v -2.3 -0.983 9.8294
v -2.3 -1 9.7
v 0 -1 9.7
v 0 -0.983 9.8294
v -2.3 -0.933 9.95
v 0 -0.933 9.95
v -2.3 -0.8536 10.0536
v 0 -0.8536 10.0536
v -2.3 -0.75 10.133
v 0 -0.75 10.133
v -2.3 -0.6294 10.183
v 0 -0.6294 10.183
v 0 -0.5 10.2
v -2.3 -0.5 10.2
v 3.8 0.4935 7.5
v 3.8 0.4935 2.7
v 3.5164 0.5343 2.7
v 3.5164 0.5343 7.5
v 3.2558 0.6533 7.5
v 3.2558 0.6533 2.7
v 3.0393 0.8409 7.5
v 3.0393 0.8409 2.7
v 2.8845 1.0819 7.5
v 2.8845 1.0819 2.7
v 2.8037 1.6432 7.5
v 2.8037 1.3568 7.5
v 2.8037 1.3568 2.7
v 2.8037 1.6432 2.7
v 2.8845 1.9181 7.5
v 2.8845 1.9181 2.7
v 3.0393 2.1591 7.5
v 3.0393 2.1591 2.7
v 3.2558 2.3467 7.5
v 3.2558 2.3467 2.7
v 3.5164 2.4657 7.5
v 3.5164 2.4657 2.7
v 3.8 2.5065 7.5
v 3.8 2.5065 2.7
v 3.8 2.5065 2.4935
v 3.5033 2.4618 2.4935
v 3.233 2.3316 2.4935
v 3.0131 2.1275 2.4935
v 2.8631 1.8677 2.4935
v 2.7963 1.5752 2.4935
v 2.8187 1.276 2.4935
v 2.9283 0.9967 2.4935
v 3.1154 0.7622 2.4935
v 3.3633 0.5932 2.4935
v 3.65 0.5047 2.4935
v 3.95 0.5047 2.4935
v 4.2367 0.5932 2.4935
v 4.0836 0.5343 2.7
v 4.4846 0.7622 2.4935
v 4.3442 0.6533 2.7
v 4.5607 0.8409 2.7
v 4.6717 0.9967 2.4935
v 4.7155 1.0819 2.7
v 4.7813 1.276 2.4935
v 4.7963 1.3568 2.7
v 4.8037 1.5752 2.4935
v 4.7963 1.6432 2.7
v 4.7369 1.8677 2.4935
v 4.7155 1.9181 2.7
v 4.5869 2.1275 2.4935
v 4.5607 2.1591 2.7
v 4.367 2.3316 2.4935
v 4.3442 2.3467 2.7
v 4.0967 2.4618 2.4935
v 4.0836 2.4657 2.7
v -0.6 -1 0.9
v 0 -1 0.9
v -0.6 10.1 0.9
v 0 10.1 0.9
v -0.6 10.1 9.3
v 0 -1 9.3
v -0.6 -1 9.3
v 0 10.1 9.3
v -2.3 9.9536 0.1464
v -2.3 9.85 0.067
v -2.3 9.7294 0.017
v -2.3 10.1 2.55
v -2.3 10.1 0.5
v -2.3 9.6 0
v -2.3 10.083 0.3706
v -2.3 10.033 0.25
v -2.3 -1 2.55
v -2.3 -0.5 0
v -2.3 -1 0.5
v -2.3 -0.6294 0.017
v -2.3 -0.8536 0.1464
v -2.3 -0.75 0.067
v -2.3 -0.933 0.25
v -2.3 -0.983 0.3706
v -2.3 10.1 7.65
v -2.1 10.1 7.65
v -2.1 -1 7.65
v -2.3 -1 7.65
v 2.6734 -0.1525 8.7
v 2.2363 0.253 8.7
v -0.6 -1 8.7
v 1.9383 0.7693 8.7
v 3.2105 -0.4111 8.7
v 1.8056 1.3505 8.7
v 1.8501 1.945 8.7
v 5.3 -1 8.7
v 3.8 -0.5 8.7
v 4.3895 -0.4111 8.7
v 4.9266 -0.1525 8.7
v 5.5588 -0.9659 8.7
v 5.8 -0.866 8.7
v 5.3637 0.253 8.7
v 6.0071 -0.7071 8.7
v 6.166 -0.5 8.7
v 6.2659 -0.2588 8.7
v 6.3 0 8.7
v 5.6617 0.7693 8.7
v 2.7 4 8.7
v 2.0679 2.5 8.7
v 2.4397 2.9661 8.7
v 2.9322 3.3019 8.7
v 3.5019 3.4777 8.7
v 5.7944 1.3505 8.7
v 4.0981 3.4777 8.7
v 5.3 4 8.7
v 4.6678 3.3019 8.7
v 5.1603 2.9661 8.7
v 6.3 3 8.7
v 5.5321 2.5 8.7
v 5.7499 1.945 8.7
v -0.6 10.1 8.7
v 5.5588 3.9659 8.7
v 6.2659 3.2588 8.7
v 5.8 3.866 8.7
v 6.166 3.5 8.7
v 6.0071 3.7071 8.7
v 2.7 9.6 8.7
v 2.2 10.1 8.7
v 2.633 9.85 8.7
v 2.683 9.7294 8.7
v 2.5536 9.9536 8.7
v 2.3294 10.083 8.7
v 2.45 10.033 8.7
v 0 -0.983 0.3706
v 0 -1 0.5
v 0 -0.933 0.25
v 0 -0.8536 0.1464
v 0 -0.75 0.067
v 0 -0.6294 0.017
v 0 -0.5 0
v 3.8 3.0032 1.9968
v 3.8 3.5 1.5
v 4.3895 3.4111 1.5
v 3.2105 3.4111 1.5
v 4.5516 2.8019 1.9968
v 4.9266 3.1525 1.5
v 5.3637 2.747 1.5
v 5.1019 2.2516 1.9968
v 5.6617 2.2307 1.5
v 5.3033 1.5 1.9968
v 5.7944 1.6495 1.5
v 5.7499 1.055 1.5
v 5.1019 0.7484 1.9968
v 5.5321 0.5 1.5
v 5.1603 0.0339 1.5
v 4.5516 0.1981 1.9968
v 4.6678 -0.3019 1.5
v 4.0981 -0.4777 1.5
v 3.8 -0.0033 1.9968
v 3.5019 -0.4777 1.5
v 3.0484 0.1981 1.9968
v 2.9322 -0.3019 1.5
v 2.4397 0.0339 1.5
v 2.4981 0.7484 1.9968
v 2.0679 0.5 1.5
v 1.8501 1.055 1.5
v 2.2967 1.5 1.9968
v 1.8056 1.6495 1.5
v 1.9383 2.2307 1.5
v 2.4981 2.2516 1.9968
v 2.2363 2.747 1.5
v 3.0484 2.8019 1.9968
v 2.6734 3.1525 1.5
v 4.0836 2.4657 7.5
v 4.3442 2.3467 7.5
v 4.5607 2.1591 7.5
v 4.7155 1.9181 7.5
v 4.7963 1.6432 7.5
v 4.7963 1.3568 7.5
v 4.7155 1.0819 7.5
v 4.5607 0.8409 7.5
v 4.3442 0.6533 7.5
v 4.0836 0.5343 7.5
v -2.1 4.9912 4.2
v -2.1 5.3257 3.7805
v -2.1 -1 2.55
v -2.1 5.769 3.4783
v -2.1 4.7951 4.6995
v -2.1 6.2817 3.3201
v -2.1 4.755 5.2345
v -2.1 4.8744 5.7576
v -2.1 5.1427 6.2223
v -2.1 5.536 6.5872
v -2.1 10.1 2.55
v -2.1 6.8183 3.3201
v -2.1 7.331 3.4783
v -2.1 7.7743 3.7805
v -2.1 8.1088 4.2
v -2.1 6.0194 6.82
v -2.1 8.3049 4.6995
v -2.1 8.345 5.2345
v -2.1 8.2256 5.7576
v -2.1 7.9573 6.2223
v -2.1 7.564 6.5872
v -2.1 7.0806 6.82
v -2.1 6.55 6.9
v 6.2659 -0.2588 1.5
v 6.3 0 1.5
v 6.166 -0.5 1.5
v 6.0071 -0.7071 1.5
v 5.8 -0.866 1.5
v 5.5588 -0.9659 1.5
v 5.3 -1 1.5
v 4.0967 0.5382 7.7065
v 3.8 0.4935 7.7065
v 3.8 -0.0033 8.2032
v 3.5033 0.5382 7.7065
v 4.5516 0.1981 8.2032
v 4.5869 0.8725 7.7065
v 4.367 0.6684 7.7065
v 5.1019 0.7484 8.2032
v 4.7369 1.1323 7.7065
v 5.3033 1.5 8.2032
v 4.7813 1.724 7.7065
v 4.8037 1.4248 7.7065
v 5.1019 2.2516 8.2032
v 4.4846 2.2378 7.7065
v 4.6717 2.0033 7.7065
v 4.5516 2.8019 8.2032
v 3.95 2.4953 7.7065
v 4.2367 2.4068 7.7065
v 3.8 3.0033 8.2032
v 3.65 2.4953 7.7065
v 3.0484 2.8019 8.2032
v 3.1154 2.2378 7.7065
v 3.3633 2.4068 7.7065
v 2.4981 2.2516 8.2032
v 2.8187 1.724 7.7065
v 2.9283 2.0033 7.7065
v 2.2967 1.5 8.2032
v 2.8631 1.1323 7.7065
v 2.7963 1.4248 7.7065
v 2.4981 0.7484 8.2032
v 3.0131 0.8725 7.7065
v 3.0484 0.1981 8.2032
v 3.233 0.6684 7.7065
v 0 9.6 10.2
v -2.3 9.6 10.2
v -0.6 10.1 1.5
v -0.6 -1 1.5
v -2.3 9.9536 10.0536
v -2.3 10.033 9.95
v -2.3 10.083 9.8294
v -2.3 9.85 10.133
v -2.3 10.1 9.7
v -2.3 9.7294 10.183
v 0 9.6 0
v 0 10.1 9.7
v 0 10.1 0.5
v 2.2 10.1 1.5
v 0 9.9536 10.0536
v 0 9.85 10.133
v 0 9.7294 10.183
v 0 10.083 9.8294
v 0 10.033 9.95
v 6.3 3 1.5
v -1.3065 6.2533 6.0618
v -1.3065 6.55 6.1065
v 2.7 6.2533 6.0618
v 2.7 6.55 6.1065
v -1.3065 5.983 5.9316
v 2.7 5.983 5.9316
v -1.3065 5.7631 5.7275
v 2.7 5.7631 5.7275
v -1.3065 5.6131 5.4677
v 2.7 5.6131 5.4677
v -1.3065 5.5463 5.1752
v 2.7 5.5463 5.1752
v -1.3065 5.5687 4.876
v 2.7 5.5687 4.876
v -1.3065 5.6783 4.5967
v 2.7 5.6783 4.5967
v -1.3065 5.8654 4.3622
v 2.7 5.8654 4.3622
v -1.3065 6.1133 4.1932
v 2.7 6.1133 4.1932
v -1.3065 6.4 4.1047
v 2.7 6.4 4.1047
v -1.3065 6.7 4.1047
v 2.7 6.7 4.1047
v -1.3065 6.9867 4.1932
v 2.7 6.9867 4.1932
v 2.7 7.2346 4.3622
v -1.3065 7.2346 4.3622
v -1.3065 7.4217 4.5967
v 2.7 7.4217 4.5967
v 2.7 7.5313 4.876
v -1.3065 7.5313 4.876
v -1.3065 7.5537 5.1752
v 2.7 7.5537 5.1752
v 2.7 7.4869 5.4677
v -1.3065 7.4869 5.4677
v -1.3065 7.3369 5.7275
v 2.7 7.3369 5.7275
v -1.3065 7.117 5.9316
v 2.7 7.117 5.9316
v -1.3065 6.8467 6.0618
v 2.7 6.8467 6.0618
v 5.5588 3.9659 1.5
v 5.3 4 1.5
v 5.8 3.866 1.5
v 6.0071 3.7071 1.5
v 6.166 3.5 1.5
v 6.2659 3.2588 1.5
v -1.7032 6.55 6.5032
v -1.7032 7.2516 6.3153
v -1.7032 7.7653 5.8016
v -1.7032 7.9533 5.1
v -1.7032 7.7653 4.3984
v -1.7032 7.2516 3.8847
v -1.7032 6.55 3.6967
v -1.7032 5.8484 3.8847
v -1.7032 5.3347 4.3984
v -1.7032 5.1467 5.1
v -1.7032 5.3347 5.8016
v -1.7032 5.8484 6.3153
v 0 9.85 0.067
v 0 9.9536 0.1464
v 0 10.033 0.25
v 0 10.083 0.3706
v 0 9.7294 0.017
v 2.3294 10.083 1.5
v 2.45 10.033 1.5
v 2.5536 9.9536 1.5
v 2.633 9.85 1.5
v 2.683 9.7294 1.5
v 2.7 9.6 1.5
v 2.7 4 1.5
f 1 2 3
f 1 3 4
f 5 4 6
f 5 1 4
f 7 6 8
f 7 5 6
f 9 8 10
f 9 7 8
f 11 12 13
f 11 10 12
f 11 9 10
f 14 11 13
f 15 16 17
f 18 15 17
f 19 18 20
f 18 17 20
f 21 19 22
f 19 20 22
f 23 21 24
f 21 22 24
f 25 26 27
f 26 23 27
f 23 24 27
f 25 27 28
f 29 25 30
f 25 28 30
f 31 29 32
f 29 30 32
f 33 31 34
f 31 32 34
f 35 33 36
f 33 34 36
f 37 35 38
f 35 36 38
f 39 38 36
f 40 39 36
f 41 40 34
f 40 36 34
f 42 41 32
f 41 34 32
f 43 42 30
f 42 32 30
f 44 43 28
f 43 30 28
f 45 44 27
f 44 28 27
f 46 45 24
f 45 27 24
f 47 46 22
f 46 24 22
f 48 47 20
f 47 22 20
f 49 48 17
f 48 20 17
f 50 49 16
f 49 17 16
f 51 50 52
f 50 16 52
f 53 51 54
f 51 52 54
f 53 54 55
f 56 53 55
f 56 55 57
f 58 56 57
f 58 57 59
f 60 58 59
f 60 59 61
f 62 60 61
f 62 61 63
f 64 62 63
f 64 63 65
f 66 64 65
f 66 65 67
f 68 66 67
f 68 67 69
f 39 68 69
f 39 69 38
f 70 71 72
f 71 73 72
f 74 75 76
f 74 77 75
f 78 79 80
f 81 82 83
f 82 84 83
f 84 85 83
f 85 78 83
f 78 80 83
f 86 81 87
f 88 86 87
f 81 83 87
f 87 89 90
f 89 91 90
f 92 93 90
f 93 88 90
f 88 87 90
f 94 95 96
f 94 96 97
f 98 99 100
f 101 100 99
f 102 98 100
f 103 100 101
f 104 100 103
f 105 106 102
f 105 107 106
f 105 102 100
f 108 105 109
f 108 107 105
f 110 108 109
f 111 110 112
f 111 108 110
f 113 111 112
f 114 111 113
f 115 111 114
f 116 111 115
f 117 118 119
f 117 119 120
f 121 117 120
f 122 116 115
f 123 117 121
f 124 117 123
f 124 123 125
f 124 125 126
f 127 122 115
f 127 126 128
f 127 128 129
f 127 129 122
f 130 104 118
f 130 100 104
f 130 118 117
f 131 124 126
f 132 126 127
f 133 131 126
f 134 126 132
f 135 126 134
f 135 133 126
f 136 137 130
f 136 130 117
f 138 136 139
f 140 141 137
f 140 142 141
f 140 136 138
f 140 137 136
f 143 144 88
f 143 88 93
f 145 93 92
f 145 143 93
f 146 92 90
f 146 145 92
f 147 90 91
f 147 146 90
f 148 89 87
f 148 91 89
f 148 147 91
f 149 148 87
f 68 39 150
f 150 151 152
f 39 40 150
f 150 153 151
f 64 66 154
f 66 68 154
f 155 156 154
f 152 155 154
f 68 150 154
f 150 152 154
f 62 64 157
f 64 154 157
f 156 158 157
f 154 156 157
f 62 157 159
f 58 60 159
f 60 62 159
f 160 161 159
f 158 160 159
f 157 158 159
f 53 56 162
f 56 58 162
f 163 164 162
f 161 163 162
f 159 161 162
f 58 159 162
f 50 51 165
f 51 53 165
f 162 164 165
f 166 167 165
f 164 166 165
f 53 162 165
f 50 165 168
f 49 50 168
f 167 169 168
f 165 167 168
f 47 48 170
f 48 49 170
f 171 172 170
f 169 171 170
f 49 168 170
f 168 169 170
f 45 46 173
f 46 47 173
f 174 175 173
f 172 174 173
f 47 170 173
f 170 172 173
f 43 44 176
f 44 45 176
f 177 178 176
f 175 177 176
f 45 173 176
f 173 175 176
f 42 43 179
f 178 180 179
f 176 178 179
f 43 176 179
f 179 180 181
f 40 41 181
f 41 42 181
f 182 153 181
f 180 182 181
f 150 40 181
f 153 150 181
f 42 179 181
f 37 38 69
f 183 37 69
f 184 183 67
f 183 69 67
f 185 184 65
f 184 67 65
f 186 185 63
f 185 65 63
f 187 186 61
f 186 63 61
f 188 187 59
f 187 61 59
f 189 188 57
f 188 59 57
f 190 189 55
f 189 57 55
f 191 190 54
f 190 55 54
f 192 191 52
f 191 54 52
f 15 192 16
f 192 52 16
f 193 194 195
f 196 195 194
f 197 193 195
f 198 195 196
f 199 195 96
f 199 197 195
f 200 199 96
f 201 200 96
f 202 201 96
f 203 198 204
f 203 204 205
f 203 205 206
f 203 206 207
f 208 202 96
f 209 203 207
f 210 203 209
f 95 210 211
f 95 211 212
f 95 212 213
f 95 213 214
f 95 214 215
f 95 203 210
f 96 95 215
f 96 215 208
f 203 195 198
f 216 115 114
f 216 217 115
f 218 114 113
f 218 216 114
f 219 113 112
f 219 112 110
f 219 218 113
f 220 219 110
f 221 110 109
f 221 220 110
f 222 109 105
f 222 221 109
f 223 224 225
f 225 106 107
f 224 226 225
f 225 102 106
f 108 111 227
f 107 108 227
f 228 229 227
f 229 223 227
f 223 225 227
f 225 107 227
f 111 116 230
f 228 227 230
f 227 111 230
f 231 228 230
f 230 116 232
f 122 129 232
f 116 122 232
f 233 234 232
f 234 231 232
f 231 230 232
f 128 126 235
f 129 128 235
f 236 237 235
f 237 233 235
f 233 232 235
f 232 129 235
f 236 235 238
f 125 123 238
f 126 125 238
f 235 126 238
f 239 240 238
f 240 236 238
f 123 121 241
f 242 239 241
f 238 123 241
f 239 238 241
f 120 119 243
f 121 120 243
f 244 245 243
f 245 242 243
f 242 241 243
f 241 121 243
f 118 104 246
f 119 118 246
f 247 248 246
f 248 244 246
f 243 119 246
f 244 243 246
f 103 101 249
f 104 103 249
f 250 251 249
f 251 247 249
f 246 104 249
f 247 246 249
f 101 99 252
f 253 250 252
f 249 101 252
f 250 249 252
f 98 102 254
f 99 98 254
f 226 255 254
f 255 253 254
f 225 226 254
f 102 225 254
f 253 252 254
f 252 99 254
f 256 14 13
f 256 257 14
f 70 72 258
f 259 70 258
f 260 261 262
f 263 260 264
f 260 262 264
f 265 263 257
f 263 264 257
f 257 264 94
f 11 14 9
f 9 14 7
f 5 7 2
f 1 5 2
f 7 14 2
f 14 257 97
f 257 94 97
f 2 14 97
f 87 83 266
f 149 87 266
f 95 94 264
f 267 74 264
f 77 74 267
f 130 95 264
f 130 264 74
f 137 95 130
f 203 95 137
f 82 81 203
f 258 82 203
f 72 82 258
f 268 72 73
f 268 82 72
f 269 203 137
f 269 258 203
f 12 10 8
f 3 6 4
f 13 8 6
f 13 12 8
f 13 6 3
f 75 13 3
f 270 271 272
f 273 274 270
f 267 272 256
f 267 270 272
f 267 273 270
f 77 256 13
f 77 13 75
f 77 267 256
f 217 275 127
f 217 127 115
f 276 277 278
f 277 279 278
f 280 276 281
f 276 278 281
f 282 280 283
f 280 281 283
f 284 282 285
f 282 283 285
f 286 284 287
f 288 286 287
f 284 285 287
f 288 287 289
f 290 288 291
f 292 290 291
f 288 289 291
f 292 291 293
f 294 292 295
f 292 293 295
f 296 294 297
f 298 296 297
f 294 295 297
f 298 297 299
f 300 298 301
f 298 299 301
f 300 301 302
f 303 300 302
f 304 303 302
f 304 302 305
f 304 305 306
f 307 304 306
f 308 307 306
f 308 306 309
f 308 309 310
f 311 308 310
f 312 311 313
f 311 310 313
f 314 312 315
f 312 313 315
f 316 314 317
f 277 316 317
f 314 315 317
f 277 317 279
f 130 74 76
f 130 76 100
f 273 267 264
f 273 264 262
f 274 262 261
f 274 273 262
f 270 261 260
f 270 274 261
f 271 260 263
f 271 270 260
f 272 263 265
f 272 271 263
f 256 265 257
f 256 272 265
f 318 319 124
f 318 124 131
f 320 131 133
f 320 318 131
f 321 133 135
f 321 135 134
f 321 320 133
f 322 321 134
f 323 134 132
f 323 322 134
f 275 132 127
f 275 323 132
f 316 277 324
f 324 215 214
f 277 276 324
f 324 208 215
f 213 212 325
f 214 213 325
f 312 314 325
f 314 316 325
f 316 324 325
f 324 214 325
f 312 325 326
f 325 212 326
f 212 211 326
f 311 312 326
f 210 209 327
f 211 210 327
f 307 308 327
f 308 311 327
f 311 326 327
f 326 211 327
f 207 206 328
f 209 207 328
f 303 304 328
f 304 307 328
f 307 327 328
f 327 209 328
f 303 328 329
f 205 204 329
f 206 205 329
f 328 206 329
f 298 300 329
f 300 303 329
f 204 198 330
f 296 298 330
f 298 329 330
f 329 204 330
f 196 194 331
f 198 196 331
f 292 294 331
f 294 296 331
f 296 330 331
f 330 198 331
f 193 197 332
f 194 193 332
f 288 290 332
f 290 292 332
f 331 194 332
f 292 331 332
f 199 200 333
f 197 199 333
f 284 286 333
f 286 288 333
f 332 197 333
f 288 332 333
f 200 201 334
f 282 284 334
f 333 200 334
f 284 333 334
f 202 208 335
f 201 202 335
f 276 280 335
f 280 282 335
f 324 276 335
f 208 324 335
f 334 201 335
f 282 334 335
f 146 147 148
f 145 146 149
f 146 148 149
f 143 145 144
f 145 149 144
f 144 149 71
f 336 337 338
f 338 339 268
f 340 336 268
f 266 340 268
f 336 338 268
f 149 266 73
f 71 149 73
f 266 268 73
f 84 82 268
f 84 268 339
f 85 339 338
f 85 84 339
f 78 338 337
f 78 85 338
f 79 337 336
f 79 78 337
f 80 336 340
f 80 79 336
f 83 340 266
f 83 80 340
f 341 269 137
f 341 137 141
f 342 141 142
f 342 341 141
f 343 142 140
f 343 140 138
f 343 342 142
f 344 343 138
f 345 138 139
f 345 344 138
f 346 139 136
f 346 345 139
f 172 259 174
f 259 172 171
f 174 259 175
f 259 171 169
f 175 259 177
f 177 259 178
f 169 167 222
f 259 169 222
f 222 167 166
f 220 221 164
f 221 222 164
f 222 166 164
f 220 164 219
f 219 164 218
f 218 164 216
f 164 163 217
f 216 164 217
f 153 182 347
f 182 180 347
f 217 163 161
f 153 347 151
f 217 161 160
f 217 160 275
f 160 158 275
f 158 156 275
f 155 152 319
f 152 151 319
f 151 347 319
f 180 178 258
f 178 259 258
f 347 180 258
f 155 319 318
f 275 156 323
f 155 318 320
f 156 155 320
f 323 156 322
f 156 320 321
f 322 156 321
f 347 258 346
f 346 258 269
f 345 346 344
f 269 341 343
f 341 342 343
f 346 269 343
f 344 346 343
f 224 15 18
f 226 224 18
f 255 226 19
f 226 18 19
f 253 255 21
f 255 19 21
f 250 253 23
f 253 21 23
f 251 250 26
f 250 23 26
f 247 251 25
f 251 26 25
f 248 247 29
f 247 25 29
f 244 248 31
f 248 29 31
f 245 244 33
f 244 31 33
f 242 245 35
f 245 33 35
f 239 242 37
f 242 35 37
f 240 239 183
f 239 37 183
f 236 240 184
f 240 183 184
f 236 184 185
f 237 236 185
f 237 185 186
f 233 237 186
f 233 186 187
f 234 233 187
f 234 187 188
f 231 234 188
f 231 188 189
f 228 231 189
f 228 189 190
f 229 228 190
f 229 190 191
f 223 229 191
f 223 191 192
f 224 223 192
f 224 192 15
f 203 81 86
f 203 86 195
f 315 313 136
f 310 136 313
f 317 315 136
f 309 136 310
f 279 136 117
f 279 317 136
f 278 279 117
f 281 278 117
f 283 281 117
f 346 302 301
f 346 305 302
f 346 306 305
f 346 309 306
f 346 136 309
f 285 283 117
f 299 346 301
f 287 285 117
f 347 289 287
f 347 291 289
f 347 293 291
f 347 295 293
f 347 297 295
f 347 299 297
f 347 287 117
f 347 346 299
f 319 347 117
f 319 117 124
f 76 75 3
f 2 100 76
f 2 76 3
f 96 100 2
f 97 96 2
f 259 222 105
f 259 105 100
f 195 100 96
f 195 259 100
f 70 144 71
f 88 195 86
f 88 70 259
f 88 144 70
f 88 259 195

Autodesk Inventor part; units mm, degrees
ref_plane "YZ Plane" through (0, 0, 0) normal (1, 0, 0) x (0, 1, 0)
ref_plane "XZ Plane" through (0, 0, 0) normal (0, 1, 0) x (-1, 0, 0)
ref_plane "XY Plane" through (0, 0, 0) normal (0, 0, 1) x (1, 0, 0)
sketch "Skizze1" plane through (0, 0, 0) normal (0, 0, 1) x (1, 0, 0)
  line L0 (2.7, 9.6) -> (2.7, 4)
  arc A0 (2.7, 9.6) -> (2.2, 10.1) centre (2.2, 9.6) ccw
  line L1 (-0.6, 10.1) -> (2.2, 10.1)
  line L2 (-2.3, 10.1) -> (-0.6, 10.1)
  line L3 (-2.3, 10.1) -> (-2.3, 9.1)
  line L4 (-2.3, 9.1) -> (-2.3, 0)
  line L5 (-2.3, 0) -> (-2.3, -1)
  line L6 (-0.6, -1) -> (-2.3, -1)
  line L7 (-0.6, -0.995) -> (0, -0.995)
  line L8 (5.3, -1) -> (-0.6, -1)
  arc A1 (5.3, -1) -> (6.3, 0) centre (5.3, 0) ccw
  line L9 (6.3, 3) -> (6.3, 0)
  arc A2 (6.3, 3) -> (5.3, 4) centre (5.3, 3) ccw
  line L10 (2.7, 4) -> (5.3, 4)
  point P0 (0, 0)
extrude "Extrusion1" add sketch "Skizze1" along normal blind 10.2
sketch "Skizze2" plane through (-2.3, 10.1, 0) normal (0, 1, 0) x (1, 0, 0)
  line L0 (0, -10.2) -> (4.5, -10.2) projected
  line L1 (0, 0) -> (0, -10.2) projected
  line L2 (2.3, 0) -> (2.3, -0.9)
  line L3 (2.3, -0.9) -> (1.7, -0.9)
  line L4 (1.7, -0.9) -> (1.7, -1.5)
  line L5 (1.7, -1.5) -> (8.6, -1.5)
  line L6 (8.6, 0) -> (8.6, -10.2) projected
  line L7 (2.3, -10.2) -> (2.3, -9.3)
  line L8 (2.3, -9.3) -> (1.7, -9.3)
  line L9 (1.7, -9.3) -> (1.7, -8.7)
  line L10 (1.7, -8.7) -> (8.6, -8.7)
  line L11 (8.6, -1.5) -> (8.6, 0)
  line L12 (2.3, 0) -> (8.6, 0)
  line L13 (2.3, -10.2) -> (8.6, -10.2)
  line L14 (8.6, -8.7) -> (8.6, -10.2)
  dimension "d2" = 0.9
  dimension "d3" = 0.6
  dimension "d4" = 0.9
  dimension "d5" = 0.6
  dimension "d6" = 2.3
  dimension "d7" = 2.3
  dimension "d8" = 1.7
  dimension "d9" = 0.6
  dimension "d10" = 1.7
extrude "Extrusion2" cut sketch "Skizze2" against normal blind 12
sketch "Skizze3" plane through (2.7, 4, 8.7) normal (1, 0, 0) x (0, 0, -1)
  line L0 (0, 5.6) -> (0, 0) projected
  line L1 (7.2, 0) -> (0, 0) projected
  line L2 (7.2, 0) -> (7.2, 5.6) projected
  line L3 (7.2, 5.6) -> (0, 5.6) projected
  line L4 (7.2, 6.1) -> (0, 6.1) projected
  line L5 (-1.5, -5) -> (-1.5, 6.1) projected
  point P0 (8.7, -4)
  point P1 (3.55, 2.55)
  dimension "d13" = 3.55
  dimension "d14" = 5.05
sketch "Skizze4" plane through (-2.3, -1, 0) normal (-1, 0, 0) x (0, 0, 1)
  line L0 (10.2, 0) -> (10.2, 11.1) projected
  line L1 (0, 11.1) -> (10.2, 11.1) projected
  line L2 (0, 0) -> (0, 11.1) projected
  line L3 (10.2, 11.1) -> (10.2, 0) projected
  line L4 (10.2, 0) -> (0, 0) projected
  line L5 (0, 0) -> (0, 11.1) projected
  line L6 (0, 11.1) -> (10.2, 11.1) projected
  line L7 (10.2, 11.1) -> (10.2, 0) projected
  line L8 (10.2, 0) -> (0, 0) projected
  line L9 (0, 0) -> (0, 11.1) projected
  line L10 (0, 11.1) -> (10.2, 11.1) projected
  line L11 (10.2, 0) -> (10.2, 11.1) projected
  line L12 (0, 11.1) -> (10.2, 11.1) projected
  line L13 (0, 0) -> (0, 11.1) projected
  line L14 (0, 0) -> (10.2, 0) projected
  line L15 (8.7, 10.6) -> (8.7, 5) projected
  line L16 (1.5, 5) -> (8.7, 5) projected
  line L17 (1.5, 5) -> (1.5, 10.6) projected
  line L18 (1.5, 10.6) -> (8.7, 10.6) projected
  point P0 (0, 1)
  point P1 (5.1, 7.55)
  dimension "d15" = 3.55
  dimension "d16" = 5.1
  dimension "d17" = 5.1
hole "Hole1" at (-2.3, 6.55, 5.1) direction (1, 0, 0) diameter 2.013 end through all countersink diameter 4 countersink angle 90 thread size "M2.5x0.45" class "6H" standard "ANSI Metric M Profile"
sketch "Skizze5" plane through (2.2, 10.1, 1.5) normal (0, 0, -1) x (-1, 0, 0)
  line L0 (-4.1, -10.1) -> (-4.1, -7.1) projected
  line L1 (2.8, -11.1) -> (-3.1, -11.1) projected
  line L2 (-3.1, -6.1) -> (-0.5, -6.1) projected
  line L3 (2.2, 0) -> (2.2, -11.1) projected
  point P0 (2.2, -10.1)
  point P1 (-1.6, -8.6)
  dimension "d25" = 2.5
  dimension "d26" = 2.5
  dimension "d27" = 2.5
  dimension "d28" = 3.8
sketch "Skizze6" plane through (-0.6, 10.1, 8.7) normal (0, 0, 1) x (1, 0, 0)
  line L0 (6.9, -7.1) -> (6.9, -10.1) projected
  line L1 (3.3, -6.1) -> (5.9, -6.1) projected
  line L2 (0.6, -11.1) -> (0.6, 0) projected
  point P0 (0.6, -10.1)
  point P1 (4.4, -8.6)
  dimension "d29" = 2.5
  dimension "d30" = 2.5
  dimension "d31" = 3.8
hole "Hole2" at (3.8, 1.5, 8.7) direction (0, 0, -1) diameter 2.013 depth 6 tip angle 118 countersink diameter 4 countersink angle 90 thread size "M2.5x0.45" class "6H" standard "ANSI Metric M Profile"
hole "Hole3" at (3.8, 1.5, 1.5) direction (0, 0, 1) diameter 2.013 depth 6 tip angle 118 countersink diameter 4 countersink angle 90 thread size "M2.5x0.45" class "6H" standard "ANSI Metric M Profile"
sketch "Skizze7" plane through (-2.3, 10.1, 10.2) normal (0, 1, 0) x (1, 0, 0)
  line L0 (0, 10.2) -> (2.3, 10.2) projected
  line L1 (0, 10.2) -> (0, 0) projected
  line L2 (0, 0) -> (2.3, 0) projected
  line L3 (0, 7.65) -> (0.2, 7.65)
  line L4 (0.2, 7.65) -> (0.2, 2.55)
  line L5 (0.2, 2.55) -> (0, 2.55)
  line L6 (0, 7.65) -> (0, 2.55)
  dimension "d46" = 2.55
  dimension "d47" = 2.55
  dimension "d48" = 0.2
extrude "Extrusion3" cut sketch "Skizze7" against normal blind 12
fillet "Rundung1" radius 0.5 1 edges at (-1.15, 10.1, 10.2)
fillet "Rundung2" radius 0.5 3 edges at (-1.15, 10.1, 0) (-1.15, -1, 0) (-1.15, -1, 10.2)
properties part number "4. Leiterplattenhalter_Links"
